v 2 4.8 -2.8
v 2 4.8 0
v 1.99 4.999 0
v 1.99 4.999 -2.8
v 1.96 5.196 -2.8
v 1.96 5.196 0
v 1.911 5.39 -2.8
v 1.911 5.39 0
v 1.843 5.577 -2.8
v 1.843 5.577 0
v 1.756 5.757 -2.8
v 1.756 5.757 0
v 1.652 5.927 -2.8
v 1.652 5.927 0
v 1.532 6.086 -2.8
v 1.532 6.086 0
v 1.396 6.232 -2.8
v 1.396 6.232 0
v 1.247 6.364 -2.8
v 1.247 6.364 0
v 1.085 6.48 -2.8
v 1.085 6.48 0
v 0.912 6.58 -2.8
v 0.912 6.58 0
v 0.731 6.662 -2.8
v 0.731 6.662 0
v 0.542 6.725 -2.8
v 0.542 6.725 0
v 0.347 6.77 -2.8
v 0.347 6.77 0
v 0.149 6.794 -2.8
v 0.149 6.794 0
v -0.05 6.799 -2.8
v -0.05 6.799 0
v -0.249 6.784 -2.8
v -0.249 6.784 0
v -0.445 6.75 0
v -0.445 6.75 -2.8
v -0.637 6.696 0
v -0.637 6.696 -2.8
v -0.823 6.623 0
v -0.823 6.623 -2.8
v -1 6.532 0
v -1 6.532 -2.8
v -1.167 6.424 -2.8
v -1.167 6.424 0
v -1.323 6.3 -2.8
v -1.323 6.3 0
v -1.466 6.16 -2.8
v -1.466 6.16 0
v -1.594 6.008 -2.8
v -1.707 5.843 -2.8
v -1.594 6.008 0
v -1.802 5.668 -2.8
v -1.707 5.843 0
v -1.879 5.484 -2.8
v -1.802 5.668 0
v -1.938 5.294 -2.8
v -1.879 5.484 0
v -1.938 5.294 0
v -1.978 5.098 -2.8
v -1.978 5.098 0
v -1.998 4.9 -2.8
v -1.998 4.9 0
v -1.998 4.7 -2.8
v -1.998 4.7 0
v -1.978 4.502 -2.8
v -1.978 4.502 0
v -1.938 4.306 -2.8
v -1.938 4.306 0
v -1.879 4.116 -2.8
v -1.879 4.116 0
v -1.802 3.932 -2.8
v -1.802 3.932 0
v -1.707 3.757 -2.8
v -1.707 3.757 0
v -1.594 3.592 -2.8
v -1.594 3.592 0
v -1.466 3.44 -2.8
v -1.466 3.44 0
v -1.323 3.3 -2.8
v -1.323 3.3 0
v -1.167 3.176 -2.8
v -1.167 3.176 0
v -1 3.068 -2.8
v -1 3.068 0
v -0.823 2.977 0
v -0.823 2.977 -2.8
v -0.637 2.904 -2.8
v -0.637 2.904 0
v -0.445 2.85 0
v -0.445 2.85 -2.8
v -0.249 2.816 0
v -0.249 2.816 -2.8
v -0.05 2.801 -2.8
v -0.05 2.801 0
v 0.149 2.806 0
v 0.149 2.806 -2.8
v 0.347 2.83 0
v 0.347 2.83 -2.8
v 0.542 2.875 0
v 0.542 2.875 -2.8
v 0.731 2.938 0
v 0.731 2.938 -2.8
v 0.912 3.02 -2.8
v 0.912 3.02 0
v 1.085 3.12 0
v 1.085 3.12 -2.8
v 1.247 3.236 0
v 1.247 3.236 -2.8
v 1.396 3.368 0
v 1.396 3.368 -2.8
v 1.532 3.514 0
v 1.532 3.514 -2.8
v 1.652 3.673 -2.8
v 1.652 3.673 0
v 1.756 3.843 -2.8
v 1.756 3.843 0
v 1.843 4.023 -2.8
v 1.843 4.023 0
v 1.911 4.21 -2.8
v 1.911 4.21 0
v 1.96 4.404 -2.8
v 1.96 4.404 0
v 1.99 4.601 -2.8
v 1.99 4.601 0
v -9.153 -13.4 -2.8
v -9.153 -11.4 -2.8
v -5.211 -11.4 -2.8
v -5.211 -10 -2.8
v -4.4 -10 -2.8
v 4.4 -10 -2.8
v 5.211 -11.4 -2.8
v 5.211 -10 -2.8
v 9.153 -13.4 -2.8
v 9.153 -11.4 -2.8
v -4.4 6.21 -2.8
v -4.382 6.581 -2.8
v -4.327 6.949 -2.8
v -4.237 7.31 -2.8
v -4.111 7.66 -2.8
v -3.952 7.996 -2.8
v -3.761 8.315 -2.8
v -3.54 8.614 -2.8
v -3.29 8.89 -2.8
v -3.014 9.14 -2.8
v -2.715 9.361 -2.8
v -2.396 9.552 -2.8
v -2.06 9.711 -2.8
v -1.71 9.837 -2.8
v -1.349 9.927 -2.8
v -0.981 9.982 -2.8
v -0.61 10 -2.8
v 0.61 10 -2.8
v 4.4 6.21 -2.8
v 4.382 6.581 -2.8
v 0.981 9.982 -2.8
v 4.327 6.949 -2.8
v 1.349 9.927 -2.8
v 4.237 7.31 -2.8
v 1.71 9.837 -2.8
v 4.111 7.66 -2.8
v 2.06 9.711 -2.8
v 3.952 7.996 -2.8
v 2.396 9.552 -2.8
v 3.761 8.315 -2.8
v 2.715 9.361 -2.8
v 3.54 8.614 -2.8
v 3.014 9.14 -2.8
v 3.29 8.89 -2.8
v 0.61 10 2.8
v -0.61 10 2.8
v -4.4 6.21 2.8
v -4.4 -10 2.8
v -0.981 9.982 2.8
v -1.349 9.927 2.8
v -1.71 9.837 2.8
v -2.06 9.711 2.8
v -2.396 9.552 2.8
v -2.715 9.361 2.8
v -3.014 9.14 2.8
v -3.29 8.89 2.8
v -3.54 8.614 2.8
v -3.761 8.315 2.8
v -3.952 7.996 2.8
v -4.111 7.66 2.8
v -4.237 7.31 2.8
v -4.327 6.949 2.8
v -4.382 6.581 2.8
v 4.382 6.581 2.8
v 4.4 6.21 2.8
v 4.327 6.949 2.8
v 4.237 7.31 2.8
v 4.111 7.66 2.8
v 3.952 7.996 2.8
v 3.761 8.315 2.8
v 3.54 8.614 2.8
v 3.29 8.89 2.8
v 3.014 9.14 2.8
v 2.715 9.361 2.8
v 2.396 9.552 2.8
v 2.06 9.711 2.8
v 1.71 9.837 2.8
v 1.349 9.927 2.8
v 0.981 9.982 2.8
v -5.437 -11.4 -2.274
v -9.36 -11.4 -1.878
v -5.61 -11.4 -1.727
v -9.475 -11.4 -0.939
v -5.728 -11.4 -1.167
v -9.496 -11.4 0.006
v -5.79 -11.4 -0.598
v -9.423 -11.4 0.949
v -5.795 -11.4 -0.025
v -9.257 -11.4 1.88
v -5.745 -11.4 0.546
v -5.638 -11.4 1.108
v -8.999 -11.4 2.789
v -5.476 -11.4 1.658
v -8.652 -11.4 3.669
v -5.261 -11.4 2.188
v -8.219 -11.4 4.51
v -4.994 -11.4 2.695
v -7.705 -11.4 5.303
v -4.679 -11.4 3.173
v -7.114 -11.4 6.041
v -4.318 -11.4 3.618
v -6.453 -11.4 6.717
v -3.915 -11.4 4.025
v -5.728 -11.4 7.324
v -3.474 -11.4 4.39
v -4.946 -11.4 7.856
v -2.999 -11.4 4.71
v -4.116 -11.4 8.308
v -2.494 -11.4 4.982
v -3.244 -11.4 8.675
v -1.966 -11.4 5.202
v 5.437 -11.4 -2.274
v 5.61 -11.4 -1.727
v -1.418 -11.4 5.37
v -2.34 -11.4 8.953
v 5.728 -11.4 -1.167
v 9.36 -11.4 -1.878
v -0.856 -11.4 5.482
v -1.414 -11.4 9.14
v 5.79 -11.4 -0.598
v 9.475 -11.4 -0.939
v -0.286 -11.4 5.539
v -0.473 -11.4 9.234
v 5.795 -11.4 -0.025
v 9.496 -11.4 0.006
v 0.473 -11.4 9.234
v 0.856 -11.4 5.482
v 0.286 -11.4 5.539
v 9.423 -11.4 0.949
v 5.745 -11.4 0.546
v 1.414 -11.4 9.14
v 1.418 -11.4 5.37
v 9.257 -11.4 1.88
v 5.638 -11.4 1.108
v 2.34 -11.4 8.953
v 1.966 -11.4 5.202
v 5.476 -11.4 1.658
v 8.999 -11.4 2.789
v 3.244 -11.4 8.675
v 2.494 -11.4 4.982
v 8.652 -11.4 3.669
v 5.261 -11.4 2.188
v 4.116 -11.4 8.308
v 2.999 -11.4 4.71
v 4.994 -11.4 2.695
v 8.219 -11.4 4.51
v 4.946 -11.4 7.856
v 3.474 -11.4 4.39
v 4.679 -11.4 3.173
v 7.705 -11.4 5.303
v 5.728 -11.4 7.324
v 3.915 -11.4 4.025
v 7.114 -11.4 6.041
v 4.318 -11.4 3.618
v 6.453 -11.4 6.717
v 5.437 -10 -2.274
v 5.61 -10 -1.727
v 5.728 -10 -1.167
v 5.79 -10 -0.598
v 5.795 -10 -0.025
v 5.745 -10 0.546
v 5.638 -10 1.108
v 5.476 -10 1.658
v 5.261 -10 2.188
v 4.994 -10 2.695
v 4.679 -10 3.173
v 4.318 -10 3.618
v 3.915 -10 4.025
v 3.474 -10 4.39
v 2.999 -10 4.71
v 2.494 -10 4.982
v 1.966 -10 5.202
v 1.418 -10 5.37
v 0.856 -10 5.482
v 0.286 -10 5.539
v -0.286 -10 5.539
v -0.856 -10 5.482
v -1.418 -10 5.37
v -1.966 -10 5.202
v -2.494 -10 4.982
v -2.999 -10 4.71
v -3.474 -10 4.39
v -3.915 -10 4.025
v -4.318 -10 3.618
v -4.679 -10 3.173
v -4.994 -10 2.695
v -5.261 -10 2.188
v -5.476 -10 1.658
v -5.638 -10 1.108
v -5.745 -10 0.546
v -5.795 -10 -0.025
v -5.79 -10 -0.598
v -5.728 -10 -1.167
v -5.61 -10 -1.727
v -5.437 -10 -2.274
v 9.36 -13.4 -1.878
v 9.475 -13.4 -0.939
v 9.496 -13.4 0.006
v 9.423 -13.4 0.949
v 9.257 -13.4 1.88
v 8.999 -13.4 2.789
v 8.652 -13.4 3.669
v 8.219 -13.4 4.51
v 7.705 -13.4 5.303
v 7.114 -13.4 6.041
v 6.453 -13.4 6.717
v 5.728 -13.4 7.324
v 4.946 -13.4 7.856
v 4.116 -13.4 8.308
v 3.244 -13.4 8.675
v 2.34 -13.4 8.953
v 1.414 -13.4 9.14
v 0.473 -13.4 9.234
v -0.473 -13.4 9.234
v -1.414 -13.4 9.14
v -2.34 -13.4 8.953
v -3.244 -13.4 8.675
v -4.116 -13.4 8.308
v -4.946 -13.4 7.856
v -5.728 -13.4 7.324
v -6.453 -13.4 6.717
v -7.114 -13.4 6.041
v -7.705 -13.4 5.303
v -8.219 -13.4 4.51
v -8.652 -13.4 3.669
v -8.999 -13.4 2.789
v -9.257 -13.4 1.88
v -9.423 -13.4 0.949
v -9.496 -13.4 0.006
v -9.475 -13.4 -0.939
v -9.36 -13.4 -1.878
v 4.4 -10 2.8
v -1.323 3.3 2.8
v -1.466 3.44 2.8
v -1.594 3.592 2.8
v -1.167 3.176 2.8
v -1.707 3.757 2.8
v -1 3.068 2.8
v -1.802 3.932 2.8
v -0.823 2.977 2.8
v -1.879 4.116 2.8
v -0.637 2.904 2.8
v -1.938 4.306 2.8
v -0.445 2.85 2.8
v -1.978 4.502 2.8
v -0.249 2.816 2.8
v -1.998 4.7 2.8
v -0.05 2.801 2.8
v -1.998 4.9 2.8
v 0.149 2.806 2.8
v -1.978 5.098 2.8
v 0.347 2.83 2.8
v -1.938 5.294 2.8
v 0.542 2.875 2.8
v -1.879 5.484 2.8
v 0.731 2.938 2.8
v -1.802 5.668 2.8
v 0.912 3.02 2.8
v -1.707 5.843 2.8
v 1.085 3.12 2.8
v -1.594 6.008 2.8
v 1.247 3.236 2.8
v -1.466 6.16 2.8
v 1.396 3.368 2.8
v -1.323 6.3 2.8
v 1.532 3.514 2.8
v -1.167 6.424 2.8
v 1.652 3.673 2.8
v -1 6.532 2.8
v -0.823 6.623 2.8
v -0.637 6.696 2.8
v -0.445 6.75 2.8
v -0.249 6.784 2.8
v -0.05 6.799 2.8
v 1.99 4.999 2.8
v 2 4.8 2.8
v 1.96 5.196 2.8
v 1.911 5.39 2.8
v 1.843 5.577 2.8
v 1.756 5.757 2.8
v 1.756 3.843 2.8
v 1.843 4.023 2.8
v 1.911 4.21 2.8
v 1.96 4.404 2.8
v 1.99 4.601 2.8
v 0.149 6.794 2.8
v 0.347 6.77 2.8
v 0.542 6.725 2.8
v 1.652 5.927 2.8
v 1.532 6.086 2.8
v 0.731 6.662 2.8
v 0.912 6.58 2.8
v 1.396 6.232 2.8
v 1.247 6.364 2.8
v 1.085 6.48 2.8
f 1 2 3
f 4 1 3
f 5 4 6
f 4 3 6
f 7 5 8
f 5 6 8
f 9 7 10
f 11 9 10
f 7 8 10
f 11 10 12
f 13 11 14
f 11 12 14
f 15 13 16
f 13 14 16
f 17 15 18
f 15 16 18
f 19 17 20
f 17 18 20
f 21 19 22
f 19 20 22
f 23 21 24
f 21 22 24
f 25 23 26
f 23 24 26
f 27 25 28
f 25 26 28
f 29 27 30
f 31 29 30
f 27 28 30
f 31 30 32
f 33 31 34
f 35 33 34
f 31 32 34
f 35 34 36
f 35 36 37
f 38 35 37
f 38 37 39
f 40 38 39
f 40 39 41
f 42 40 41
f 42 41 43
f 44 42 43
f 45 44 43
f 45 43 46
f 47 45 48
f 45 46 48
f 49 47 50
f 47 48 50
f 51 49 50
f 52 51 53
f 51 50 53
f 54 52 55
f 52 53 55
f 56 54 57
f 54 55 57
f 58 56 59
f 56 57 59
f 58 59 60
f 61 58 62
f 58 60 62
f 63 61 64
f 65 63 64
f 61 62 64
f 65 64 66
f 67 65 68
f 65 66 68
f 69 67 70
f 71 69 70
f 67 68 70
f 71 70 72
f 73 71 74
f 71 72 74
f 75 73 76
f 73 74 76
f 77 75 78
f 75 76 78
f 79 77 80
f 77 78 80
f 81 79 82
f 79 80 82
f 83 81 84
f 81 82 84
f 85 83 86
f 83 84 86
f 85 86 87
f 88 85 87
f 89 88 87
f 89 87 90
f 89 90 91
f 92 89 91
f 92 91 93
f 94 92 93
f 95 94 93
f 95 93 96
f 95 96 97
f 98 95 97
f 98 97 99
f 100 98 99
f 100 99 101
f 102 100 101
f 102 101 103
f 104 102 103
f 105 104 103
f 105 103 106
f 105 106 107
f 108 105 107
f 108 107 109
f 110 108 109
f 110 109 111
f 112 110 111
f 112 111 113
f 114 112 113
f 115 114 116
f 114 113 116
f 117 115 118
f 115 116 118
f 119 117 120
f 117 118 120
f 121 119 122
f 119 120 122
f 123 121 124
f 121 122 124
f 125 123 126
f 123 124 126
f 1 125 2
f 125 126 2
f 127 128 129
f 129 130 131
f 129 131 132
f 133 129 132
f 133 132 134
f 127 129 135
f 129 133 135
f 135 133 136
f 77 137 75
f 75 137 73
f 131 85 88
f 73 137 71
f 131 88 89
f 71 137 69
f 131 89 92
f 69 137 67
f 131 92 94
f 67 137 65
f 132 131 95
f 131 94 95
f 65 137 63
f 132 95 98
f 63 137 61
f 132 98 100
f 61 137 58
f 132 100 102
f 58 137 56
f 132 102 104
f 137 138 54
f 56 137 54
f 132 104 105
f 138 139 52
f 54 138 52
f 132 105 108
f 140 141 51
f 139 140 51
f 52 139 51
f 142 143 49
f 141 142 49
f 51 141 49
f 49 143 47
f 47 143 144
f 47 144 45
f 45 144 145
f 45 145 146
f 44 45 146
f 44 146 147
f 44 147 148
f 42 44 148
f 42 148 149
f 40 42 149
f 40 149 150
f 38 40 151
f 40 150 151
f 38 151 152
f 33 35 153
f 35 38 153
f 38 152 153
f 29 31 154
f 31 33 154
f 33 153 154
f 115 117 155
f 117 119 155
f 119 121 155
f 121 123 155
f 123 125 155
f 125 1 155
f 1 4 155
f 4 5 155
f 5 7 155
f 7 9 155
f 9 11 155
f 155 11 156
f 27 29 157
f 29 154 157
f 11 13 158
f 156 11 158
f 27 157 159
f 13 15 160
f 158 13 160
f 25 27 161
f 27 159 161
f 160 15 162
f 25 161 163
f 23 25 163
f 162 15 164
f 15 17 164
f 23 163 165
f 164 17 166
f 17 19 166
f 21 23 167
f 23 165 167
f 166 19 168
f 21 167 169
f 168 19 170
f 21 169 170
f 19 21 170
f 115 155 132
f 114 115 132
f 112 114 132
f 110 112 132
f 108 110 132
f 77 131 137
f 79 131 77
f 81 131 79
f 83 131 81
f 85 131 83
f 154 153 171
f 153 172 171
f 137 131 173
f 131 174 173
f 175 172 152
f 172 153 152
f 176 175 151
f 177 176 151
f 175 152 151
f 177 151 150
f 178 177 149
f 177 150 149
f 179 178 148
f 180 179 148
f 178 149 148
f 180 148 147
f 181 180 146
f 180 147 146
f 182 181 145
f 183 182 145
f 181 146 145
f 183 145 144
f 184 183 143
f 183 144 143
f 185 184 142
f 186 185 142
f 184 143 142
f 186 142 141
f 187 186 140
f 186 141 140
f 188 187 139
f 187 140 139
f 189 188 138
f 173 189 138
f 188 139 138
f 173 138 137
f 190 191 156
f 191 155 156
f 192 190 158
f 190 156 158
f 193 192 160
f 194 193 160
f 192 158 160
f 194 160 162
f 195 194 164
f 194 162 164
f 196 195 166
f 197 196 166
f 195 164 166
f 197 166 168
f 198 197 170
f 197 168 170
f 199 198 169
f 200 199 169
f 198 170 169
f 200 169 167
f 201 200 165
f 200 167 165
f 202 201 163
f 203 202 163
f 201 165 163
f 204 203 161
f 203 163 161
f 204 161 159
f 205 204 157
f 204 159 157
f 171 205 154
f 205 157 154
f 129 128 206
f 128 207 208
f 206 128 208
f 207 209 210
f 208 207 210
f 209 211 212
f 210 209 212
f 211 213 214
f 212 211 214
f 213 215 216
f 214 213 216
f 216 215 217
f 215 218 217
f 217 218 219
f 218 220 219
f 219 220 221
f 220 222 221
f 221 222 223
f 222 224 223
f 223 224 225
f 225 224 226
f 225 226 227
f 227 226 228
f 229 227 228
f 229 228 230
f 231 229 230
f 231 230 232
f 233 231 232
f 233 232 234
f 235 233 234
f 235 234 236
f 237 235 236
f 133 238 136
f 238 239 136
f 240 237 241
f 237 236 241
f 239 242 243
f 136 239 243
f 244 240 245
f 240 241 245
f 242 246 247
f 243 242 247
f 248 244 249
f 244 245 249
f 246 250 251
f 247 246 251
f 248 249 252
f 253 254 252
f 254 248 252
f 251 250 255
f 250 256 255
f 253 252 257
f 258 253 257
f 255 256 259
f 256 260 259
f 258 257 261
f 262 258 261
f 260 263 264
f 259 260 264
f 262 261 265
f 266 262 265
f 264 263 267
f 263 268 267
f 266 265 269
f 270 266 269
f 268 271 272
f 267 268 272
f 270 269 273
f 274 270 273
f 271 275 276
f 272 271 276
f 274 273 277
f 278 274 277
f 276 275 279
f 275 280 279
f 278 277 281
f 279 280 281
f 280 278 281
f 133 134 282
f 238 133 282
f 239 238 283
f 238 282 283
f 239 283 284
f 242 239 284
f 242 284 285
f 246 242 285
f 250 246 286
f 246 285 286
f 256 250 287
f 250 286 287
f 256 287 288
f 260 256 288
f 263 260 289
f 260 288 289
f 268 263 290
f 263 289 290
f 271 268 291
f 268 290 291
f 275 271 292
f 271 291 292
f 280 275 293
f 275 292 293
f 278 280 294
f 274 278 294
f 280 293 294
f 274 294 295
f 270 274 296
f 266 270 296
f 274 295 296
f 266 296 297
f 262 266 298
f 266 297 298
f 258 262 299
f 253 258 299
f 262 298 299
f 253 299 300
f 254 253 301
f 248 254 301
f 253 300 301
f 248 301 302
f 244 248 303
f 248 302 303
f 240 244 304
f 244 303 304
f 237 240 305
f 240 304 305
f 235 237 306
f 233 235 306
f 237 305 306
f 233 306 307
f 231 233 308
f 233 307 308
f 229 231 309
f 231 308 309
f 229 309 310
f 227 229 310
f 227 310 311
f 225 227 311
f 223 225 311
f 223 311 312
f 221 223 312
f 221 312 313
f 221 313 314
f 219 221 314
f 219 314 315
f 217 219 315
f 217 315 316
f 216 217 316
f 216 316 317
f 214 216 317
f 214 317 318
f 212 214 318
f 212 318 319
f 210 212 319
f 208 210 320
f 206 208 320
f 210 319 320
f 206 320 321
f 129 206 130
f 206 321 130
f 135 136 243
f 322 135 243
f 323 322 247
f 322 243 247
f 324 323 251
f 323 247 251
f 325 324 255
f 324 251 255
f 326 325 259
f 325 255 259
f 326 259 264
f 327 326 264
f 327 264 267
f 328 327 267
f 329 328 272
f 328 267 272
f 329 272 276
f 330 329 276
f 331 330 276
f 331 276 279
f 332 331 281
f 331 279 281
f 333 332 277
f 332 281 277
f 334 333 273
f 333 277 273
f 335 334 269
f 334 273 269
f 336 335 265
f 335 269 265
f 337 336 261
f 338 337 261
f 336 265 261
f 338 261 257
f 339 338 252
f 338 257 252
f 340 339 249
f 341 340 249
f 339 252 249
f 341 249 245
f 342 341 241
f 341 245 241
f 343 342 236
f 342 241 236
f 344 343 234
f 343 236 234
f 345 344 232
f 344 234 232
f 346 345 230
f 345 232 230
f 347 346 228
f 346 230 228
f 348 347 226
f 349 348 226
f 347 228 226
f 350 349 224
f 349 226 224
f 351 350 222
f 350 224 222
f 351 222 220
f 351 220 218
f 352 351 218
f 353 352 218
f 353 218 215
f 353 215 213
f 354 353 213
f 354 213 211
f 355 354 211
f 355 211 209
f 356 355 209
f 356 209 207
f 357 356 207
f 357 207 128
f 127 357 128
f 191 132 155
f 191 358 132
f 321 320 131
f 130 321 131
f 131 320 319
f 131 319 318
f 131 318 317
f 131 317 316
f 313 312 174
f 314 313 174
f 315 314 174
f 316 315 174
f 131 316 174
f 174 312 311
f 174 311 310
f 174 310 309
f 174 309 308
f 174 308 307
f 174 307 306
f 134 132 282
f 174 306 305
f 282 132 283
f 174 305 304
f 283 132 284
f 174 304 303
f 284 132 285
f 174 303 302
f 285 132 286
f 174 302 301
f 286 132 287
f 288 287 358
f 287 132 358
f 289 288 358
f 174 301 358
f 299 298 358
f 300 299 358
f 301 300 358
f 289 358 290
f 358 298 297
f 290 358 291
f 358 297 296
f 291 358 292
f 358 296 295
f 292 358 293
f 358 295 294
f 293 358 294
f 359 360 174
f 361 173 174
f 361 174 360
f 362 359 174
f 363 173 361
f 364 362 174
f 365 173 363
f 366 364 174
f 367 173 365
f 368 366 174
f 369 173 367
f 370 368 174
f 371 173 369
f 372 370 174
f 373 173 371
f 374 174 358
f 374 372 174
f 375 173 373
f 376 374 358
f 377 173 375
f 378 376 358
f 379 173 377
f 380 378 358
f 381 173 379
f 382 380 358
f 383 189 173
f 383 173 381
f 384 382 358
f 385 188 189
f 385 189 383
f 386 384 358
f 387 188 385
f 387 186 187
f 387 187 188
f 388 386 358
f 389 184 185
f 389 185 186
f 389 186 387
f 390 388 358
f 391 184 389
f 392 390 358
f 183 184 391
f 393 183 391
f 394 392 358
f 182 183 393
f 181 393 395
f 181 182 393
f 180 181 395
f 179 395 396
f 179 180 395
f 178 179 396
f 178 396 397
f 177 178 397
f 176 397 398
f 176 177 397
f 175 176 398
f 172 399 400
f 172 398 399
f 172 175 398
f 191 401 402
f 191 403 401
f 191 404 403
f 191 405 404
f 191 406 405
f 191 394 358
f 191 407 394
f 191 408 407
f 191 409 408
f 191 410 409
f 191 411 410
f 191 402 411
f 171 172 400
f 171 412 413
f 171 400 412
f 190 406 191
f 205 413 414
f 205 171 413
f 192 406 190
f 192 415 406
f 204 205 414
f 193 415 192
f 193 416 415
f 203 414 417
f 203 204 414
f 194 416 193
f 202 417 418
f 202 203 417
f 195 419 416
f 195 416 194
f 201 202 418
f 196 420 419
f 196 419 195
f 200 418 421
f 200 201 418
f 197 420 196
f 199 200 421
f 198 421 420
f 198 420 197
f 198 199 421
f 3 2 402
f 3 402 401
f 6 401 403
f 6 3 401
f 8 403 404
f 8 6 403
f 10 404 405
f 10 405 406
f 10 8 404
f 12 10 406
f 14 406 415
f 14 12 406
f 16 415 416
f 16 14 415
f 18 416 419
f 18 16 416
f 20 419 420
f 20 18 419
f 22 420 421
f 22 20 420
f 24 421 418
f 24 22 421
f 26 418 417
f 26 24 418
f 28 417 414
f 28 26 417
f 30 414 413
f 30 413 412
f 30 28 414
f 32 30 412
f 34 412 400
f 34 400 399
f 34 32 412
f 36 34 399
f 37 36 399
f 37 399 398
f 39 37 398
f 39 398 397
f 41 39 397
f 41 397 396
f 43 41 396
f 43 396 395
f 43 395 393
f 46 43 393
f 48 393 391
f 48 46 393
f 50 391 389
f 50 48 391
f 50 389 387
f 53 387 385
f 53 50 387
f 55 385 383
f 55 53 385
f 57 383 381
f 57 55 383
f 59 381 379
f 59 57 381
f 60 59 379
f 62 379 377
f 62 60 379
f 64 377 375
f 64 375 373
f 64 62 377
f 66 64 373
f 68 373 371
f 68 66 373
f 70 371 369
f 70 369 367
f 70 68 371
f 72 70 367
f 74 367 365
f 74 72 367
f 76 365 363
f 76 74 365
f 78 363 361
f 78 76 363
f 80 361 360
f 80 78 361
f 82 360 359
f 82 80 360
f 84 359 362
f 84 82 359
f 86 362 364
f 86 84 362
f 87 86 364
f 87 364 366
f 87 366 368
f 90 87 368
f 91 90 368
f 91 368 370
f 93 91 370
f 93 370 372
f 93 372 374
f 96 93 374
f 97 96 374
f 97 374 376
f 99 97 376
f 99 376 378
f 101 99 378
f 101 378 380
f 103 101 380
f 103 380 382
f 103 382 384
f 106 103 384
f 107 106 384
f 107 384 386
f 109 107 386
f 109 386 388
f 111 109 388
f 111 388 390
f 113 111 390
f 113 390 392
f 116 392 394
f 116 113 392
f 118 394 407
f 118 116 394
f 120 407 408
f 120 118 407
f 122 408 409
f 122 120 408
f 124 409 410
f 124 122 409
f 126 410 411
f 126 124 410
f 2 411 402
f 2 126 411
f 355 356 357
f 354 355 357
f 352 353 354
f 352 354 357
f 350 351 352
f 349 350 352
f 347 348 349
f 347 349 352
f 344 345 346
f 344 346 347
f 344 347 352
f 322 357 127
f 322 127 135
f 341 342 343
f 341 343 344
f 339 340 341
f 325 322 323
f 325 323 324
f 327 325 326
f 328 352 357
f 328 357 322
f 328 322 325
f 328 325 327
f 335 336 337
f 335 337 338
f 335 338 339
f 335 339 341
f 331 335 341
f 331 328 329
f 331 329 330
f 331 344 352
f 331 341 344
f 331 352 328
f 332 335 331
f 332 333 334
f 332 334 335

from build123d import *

# Parameters (mm, degrees)
F0_W          = 8.8
F0_H          = 20
F0_R          = 2
F1_DEPTH      = 2.8
F1_DEPTH_BACK = 2.8
F2_W          = 8.8
F2_H          = 5.6
F3_DEPTH      = 1.4
F4_START      = 1.4
F4_DEPTH      = 2
F5_R          = 3.7903152929


with BuildPart() as f1:
    # F0 (on Top) → F1 (new body, two sides)
    with BuildSketch(Plane.XY) as f1_sk:
        Rectangle(F0_W, F0_H)
        with Locations((0, 4.8)):
            Circle(F0_R, mode=Mode.SUBTRACT)
    extrude(amount=F1_DEPTH)
    extrude(f1_sk.sketch, amount=-F1_DEPTH_BACK)

    # F2 (on face) → F3 (join)
    with BuildSketch(Plane.XZ.offset(10)):
        with BuildLine():
            Line((4.4, -2.8), (5.2114805567, -2.8))
            ThreePointArc((5.2114805567, -2.8), (0, 5.5456768073), (-5.2114805567, -2.8))
            Line((-5.2114805567, -2.8), (-4.4, -2.8))
            Line((-4.4, -2.8), (-4.4, 2.8))
            Line((-4.4, 2.8), (4.4, 2.8))
            Line((4.4, 2.8), (4.4, -2.8))
        make_face()
        Rectangle(F2_W, F2_H)
    extrude(amount=F3_DEPTH)

    # F2 (on face) → F4 (join)
    with BuildSketch(Plane.XZ.offset(10).offset(F4_START)):
        Rectangle(F2_W, F2_H)
        with BuildLine():
            Line((4.4, -2.8), (5.2114805567, -2.8))
            ThreePointArc((5.2114805567, -2.8), (0, 5.5456768073), (-5.2114805567, -2.8))
            Line((-5.2114805567, -2.8), (-4.4, -2.8))
            Line((-4.4, -2.8), (-4.4, 2.8))
            Line((-4.4, 2.8), (4.4, 2.8))
            Line((4.4, 2.8), (4.4, -2.8))
        make_face()
        with BuildLine():
            ThreePointArc((-5.2114805567, -2.8), (0, 5.5456768073), (5.2114805567, -2.8))
            Line((5.2114805567, -2.8), (9.1525695623, -2.8))
            ThreePointArc((9.1525695623, -2.8), (0, 9.2456768073), (-9.1525695623, -2.8))
            Line((-9.1525695623, -2.8), (-5.2114805567, -2.8))
        make_face()
    extrude(amount=F4_DEPTH)

    # F5
    f5_edges = [f1.edges().sort_by_distance(p)[0] for p in [
        (4.4, 10, 0),
        (-4.4, 10, 0),
    ]]
    fillet(f5_edges, radius=F5_R)


solid = f1.part
